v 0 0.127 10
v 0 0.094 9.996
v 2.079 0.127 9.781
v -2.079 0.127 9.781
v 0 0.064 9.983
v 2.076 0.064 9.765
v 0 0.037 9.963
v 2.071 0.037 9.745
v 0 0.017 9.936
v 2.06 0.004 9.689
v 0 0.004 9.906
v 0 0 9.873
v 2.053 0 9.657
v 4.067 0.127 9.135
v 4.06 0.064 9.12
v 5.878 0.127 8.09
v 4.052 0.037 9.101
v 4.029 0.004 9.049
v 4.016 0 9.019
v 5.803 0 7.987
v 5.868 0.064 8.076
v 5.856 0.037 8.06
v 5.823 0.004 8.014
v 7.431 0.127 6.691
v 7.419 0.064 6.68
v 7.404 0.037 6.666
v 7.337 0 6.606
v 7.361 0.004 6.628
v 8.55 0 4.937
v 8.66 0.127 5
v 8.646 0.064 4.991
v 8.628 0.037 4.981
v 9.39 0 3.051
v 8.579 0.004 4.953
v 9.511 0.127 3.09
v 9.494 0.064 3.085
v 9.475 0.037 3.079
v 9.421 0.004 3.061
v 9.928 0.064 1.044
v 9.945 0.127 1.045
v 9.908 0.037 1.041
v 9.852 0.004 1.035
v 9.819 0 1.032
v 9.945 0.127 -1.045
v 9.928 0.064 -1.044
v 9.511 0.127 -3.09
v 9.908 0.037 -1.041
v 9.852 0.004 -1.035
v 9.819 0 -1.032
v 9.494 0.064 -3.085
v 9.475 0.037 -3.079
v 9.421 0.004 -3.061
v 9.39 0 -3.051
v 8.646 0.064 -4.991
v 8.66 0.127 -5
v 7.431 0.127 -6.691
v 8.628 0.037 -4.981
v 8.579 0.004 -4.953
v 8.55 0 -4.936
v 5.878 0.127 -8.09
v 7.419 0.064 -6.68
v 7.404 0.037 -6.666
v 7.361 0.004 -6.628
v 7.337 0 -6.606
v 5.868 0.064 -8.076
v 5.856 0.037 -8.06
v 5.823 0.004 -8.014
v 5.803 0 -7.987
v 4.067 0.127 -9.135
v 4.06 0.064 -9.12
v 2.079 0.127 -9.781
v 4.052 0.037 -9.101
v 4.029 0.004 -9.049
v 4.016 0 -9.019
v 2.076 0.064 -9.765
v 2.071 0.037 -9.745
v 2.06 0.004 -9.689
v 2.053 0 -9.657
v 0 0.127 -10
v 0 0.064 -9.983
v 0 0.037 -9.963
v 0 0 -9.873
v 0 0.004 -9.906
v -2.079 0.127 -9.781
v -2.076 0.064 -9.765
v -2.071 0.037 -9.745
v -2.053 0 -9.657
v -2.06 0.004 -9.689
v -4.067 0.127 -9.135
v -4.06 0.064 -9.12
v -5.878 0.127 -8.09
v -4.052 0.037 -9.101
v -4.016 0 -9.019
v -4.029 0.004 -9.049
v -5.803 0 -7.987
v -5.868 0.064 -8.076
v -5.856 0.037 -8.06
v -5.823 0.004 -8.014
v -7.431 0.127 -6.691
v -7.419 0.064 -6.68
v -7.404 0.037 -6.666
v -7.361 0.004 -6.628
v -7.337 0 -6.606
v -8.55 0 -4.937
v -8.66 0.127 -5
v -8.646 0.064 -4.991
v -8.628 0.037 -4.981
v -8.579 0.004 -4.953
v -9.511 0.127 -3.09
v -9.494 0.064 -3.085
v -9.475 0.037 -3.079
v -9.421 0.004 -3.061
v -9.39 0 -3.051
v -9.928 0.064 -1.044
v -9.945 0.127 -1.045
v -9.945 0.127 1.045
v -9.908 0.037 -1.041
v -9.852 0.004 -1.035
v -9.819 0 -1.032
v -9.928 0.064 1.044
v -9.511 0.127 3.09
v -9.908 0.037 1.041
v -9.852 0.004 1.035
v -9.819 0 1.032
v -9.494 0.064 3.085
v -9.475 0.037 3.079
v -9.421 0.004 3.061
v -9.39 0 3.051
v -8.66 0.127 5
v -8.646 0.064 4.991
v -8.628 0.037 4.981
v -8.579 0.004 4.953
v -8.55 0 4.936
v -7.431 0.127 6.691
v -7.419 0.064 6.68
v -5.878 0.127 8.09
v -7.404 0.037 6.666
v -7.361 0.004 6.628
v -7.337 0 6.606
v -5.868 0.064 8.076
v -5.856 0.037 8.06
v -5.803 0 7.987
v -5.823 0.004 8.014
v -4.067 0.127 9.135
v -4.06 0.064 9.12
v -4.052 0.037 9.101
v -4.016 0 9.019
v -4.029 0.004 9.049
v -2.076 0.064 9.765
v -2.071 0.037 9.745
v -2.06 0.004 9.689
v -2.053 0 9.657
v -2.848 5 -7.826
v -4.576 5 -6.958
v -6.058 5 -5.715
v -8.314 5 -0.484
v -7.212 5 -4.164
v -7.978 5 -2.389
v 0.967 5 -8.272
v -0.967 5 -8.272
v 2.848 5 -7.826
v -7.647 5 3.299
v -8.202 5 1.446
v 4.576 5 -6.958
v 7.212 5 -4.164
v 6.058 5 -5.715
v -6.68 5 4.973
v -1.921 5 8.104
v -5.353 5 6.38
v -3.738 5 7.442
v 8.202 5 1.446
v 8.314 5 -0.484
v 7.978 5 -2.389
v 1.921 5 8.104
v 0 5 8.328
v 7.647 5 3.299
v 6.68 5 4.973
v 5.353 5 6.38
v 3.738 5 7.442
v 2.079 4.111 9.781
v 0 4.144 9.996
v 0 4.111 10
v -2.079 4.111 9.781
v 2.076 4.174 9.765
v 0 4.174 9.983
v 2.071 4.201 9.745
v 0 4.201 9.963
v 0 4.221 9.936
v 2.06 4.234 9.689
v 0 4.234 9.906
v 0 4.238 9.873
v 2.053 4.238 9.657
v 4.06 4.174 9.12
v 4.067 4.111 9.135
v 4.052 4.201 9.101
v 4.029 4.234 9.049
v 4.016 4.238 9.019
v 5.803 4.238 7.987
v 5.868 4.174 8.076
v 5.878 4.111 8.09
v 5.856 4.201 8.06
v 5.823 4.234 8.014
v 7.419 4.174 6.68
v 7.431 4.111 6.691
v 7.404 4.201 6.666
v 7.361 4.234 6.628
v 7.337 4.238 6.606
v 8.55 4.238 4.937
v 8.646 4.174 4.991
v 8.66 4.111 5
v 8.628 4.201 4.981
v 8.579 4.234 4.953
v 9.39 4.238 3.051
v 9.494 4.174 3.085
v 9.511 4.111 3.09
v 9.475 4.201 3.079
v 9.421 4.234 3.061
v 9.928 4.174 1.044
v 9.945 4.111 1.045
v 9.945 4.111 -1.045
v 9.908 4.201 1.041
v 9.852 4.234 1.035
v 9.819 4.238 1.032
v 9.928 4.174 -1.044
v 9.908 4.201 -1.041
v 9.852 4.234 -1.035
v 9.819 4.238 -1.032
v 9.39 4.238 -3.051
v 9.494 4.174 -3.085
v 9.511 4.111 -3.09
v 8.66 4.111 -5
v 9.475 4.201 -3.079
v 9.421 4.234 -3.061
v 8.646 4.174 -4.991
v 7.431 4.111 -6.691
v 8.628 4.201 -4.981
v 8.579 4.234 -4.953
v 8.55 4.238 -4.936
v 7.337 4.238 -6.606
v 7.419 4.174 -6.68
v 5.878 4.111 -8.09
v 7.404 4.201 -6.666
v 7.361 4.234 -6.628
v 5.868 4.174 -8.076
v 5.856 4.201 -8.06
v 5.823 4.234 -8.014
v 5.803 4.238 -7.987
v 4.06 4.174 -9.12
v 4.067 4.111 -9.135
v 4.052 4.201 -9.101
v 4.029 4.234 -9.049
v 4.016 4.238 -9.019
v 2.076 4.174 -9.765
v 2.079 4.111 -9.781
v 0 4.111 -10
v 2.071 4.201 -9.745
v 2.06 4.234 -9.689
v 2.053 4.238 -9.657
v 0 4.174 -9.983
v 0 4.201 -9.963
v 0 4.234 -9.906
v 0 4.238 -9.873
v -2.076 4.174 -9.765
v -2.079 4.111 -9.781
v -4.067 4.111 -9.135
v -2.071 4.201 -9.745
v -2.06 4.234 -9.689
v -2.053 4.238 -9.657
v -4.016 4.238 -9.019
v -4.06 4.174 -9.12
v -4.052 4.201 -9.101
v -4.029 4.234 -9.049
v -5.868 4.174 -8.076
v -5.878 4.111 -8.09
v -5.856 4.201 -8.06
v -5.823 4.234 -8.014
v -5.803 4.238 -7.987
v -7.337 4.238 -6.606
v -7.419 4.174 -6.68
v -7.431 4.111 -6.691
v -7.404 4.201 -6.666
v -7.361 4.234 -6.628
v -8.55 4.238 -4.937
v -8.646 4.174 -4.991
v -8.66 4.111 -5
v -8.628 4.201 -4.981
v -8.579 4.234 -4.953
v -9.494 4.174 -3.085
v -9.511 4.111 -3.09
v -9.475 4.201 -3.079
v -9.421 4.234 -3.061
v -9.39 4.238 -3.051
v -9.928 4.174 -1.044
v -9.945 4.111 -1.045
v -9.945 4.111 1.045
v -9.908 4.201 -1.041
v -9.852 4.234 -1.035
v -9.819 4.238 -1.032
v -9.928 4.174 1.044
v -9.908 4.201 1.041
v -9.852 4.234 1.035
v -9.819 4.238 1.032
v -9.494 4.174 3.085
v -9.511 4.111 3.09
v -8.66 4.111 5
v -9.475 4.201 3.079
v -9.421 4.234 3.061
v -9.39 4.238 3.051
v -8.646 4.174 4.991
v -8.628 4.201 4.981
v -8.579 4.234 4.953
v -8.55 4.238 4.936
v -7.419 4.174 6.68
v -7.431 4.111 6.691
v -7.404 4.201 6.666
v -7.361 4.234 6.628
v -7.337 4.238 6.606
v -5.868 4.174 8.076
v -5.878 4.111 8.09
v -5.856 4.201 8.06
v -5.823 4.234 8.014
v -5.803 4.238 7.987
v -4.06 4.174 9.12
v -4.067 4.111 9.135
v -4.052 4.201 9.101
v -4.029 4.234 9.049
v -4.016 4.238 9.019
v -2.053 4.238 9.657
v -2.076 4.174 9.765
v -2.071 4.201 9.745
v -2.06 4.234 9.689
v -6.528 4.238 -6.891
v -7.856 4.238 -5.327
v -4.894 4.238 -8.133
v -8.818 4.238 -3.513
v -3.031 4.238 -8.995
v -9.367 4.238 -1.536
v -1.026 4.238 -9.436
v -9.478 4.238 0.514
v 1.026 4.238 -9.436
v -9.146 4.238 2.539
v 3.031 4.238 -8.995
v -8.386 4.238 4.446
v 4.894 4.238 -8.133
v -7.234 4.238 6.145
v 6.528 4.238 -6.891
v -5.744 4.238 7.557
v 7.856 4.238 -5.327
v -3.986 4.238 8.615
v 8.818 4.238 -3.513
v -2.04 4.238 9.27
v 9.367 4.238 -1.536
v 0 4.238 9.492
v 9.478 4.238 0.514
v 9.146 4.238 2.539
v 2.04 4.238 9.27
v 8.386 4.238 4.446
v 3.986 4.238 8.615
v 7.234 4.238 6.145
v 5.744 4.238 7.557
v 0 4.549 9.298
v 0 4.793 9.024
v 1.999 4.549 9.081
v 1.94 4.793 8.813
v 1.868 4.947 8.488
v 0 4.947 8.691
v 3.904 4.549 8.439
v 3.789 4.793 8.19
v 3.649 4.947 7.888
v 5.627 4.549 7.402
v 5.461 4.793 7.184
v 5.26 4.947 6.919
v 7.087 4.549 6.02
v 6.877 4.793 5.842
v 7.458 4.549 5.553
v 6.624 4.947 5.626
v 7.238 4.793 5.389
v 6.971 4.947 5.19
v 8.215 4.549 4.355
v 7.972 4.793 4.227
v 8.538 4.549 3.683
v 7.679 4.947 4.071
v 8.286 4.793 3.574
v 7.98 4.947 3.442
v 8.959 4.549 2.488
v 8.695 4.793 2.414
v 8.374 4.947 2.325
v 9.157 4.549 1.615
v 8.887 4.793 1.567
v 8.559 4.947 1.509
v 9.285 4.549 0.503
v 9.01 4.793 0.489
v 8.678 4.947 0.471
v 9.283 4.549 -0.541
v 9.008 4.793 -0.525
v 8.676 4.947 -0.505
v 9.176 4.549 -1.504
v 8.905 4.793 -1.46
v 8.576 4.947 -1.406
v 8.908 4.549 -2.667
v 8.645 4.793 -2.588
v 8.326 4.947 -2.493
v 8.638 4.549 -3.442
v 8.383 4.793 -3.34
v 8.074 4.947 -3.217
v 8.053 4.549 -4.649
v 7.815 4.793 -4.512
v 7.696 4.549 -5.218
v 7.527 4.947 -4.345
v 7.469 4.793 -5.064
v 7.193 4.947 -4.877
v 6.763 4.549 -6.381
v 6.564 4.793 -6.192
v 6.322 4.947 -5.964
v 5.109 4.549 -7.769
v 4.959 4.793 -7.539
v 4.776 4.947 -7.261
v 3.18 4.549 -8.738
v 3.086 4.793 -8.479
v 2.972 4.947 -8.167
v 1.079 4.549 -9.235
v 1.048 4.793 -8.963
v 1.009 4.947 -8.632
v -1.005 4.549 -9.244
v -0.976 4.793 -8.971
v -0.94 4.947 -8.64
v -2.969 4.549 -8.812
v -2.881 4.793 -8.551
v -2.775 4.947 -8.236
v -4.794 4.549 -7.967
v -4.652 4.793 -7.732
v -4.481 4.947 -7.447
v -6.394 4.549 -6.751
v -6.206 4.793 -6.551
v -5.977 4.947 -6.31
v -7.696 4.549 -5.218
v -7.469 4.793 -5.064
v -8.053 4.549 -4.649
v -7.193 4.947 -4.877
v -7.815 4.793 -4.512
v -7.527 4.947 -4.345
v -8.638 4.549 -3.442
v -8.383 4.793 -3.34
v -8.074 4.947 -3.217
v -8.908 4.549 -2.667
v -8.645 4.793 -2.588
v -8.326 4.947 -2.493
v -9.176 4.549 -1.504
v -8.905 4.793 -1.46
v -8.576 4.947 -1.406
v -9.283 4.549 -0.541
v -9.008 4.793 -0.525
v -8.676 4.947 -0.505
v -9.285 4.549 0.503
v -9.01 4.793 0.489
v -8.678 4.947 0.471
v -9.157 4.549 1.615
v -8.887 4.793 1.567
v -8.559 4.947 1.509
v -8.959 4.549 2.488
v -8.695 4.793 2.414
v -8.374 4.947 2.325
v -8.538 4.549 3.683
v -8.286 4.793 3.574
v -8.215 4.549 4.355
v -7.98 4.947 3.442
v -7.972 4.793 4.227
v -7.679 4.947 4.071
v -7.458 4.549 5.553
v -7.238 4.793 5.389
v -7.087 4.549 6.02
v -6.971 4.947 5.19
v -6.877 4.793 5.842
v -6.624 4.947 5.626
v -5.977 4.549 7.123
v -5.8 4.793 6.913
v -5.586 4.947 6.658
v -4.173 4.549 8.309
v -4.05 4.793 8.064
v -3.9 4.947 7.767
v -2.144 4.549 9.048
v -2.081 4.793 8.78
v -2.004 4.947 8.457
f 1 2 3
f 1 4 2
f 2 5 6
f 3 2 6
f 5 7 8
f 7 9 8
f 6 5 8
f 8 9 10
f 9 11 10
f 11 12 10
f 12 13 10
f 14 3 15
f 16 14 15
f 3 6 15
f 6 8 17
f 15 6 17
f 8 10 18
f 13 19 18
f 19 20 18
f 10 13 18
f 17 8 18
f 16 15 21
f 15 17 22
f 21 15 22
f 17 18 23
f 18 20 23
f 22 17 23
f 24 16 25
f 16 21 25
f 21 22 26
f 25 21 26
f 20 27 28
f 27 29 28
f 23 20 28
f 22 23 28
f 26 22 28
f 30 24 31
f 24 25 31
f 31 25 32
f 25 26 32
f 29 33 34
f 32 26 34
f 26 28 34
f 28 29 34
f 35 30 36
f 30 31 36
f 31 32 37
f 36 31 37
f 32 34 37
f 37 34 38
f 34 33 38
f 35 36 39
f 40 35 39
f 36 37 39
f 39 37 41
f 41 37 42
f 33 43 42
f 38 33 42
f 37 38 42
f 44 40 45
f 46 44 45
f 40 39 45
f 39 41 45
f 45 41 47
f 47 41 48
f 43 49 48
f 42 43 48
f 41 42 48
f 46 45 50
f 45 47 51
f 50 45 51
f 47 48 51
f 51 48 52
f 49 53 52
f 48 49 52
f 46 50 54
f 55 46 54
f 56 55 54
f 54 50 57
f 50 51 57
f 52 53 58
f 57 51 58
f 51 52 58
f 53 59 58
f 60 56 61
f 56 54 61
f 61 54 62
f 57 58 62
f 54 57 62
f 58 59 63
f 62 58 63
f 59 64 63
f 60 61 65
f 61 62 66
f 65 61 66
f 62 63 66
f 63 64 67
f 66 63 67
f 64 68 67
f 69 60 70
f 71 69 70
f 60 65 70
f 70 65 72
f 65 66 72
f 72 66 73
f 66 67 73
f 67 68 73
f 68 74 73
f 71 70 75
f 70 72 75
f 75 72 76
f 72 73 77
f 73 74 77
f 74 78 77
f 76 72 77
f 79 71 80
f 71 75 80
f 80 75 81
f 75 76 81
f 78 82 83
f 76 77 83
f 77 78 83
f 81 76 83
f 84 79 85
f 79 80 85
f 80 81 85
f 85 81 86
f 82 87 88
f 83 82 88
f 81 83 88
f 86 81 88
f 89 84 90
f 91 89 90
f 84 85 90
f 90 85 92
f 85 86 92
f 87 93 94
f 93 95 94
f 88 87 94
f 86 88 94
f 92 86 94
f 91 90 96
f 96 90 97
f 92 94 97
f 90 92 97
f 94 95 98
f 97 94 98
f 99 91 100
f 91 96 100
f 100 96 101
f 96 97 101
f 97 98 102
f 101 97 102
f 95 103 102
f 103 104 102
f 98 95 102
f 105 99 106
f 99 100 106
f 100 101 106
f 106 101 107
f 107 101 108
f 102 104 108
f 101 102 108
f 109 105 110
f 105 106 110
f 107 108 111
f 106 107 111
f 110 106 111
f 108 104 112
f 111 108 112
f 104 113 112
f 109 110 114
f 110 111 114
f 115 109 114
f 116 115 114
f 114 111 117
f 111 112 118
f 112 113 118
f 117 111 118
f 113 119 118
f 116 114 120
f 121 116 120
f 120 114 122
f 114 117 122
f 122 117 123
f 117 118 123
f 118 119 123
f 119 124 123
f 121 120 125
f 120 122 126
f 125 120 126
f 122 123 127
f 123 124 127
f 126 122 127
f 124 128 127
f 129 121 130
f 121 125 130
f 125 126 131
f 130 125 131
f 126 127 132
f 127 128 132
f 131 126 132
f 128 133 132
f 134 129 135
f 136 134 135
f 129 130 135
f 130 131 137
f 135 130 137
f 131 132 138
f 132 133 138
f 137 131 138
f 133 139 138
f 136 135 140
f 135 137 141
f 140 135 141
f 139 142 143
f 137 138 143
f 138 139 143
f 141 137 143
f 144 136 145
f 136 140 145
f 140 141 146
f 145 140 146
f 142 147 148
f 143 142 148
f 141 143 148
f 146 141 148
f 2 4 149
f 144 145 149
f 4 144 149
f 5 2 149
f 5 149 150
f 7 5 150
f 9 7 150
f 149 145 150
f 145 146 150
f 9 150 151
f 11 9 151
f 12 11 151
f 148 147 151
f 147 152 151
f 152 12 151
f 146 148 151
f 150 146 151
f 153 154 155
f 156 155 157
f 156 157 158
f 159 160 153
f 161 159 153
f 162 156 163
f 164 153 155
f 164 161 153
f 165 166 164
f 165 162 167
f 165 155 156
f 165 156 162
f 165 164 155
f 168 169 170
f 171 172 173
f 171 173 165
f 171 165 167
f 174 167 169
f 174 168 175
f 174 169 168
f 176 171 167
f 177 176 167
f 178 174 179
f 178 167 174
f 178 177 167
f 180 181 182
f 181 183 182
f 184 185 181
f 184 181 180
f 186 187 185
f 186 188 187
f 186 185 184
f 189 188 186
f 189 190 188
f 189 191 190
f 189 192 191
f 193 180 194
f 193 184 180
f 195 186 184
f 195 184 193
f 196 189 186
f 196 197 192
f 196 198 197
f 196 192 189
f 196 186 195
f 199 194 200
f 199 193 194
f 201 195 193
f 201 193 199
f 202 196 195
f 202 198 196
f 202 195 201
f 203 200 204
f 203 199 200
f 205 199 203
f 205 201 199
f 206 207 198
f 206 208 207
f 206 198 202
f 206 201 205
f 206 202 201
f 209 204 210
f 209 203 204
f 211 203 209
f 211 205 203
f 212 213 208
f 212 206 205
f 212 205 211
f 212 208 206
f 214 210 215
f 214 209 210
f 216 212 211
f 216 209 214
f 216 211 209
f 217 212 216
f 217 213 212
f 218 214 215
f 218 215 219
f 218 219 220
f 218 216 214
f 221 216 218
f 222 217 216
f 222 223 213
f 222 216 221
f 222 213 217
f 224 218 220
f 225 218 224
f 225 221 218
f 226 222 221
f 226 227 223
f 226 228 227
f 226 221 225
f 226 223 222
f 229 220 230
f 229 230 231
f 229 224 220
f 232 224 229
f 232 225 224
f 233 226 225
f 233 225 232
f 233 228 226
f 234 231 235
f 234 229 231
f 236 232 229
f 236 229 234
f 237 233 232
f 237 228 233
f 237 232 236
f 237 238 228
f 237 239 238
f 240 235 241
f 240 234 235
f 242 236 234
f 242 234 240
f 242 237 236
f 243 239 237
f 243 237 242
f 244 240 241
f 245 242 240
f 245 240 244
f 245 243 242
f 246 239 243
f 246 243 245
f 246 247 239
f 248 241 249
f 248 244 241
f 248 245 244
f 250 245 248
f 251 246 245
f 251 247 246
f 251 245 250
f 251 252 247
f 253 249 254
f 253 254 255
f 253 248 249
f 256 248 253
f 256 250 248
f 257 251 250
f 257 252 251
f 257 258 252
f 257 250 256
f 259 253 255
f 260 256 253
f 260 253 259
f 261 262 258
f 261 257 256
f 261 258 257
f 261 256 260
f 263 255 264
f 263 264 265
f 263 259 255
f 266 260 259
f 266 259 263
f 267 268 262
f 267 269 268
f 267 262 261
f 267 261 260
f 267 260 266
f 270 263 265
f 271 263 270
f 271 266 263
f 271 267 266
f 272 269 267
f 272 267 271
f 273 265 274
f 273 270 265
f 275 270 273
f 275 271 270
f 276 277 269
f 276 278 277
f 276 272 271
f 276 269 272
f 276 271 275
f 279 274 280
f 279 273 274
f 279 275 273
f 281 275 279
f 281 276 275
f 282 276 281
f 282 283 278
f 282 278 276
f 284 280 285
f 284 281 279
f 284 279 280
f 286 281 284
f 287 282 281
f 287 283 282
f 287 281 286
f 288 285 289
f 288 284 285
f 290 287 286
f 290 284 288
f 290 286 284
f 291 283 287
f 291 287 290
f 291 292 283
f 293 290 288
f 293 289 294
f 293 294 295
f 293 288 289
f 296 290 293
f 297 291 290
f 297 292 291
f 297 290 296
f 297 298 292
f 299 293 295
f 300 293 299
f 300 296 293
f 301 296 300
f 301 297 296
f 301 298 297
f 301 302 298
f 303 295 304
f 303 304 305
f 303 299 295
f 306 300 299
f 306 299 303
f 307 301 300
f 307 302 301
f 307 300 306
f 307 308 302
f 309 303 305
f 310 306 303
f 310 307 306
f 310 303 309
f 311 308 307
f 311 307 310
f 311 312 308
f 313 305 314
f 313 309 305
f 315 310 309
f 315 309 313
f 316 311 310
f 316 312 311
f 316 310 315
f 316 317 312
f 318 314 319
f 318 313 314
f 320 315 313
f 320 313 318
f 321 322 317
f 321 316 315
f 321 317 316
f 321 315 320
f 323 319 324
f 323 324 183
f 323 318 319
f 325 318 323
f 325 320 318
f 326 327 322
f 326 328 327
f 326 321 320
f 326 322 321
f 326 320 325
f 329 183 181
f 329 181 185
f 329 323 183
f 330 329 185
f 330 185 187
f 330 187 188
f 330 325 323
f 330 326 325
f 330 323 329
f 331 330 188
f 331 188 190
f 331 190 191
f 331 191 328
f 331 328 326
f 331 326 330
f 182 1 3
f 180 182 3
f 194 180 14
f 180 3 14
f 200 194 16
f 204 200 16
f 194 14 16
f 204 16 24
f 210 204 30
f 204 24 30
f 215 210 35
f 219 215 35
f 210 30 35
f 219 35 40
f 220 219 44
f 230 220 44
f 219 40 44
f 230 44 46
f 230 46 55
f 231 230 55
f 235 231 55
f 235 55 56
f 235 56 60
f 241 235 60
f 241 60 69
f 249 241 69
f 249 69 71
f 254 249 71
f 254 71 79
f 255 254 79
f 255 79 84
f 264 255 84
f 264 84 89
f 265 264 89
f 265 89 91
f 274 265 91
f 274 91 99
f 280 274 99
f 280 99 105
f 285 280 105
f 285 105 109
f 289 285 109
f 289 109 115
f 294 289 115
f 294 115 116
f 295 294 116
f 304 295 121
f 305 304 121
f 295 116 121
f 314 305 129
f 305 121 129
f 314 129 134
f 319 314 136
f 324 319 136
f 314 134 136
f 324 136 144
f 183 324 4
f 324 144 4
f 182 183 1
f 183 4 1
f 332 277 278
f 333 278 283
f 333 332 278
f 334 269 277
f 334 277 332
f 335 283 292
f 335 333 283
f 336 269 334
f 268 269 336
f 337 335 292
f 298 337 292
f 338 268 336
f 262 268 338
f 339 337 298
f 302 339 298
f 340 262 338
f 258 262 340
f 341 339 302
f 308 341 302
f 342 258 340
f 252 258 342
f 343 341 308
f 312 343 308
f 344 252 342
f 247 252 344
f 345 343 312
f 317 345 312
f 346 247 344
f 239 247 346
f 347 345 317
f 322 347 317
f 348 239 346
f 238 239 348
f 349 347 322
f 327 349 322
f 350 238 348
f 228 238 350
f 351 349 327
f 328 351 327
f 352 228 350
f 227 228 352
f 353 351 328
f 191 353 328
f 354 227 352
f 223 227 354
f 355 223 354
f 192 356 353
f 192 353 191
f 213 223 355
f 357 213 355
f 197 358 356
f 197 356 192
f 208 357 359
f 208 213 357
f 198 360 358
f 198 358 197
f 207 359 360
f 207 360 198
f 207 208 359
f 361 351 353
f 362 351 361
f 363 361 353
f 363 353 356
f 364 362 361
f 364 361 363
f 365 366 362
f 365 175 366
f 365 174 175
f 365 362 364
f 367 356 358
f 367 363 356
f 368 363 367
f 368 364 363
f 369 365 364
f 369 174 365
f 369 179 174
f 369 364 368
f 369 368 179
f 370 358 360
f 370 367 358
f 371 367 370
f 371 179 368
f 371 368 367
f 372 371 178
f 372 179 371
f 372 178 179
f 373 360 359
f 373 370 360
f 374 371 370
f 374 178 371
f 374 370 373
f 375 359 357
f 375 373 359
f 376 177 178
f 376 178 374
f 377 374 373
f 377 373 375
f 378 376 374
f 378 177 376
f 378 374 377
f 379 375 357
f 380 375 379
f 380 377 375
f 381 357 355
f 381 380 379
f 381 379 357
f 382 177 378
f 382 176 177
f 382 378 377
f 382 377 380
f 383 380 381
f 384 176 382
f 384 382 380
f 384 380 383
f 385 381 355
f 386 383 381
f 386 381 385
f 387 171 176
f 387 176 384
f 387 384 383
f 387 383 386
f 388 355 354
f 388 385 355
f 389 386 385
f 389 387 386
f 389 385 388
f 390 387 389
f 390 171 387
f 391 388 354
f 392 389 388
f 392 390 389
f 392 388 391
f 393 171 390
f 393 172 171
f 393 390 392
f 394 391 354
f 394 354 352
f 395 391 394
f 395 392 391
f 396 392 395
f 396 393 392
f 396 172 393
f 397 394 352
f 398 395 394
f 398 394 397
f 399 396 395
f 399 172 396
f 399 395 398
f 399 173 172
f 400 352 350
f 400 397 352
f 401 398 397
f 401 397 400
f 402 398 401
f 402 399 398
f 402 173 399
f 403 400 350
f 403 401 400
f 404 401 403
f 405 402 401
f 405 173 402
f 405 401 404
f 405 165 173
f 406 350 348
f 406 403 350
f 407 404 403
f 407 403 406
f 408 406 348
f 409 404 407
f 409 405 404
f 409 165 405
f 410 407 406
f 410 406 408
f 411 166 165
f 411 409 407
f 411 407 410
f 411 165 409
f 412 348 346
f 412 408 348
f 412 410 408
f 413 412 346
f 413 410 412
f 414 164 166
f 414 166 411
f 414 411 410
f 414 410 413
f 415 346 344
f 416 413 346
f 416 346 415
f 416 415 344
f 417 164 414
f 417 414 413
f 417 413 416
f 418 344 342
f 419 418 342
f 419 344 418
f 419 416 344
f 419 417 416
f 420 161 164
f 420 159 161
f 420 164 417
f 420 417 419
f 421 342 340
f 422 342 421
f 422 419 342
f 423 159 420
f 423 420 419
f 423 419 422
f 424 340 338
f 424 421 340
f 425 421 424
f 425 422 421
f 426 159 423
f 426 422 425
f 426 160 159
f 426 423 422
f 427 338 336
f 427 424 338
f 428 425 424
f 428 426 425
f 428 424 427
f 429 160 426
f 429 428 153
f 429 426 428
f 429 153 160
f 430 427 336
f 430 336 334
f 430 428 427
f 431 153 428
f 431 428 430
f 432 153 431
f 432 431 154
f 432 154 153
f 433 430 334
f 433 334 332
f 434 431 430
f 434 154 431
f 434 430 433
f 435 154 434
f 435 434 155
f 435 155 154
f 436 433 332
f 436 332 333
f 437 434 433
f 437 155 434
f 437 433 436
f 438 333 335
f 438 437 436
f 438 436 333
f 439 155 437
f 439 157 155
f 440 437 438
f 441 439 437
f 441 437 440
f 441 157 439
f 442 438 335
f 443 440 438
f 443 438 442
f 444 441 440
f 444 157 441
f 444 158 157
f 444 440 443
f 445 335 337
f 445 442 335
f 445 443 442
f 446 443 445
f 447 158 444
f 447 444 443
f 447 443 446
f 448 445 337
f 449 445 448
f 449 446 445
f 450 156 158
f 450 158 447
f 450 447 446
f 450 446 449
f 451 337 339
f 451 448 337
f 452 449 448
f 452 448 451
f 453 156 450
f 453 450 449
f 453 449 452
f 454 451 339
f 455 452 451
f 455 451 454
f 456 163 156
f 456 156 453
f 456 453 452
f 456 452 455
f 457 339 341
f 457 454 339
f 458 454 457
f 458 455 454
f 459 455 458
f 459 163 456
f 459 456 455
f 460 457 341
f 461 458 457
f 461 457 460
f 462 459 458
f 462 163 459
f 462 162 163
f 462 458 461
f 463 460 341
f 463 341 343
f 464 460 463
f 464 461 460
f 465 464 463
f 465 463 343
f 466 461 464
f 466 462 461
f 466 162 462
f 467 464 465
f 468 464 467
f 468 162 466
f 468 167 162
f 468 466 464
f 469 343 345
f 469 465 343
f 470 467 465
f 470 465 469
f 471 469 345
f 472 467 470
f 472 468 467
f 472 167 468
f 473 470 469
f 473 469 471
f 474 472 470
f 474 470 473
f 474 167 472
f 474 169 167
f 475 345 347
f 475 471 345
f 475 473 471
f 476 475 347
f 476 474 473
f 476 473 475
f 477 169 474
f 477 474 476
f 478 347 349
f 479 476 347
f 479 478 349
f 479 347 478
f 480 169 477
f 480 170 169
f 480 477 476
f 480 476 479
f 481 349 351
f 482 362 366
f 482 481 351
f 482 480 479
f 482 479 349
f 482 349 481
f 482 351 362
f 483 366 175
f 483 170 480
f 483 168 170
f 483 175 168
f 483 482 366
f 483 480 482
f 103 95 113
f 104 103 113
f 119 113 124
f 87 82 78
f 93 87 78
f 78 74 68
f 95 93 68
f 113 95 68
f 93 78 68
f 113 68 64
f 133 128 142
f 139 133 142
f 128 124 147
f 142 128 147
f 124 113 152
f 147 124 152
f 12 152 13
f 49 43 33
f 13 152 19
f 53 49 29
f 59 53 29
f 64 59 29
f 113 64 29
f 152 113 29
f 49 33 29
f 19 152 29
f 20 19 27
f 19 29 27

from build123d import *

# Parameters (mm, degrees)
SKETCH1_R           = 10
BOSS_EXTRUDE1_DEPTH = 5
CUT_EXTRUDE1_START  = -0.762
SKETCH2_R           = 10
SKETCH2_R_2         = 9.492
CUT_EXTRUDE1_DEPTH  = 0.762
FILLET3_R           = 1.27
FILLET2_R           = 0.127


with BuildPart() as part:
    # Sketch1 → Boss-Extrude1 (new body)
    with BuildSketch(Plane(origin=(0, 0, 0), x_dir=(1, 0, 0), z_dir=(0, 1, 0))):
        with Locations(Location((0, 0, 0), (0, 0, 270))):
            Circle(SKETCH1_R)
    extrude(amount=BOSS_EXTRUDE1_DEPTH)

    # Sketch2 → Cut-Extrude1 (cut)
    with BuildSketch(Plane(origin=(0, 5, 0), x_dir=(1, 0, 0), z_dir=(0, 1, 0)).offset(CUT_EXTRUDE1_START)):
        with Locations(Location((0, 0, 0), (0, 0, 270))):
            Circle(SKETCH2_R)
        with Locations(Location((0, 0, 0), (0, 0, 270))):
            Circle(SKETCH2_R_2, mode=Mode.SUBTRACT)
    extrude(amount=CUT_EXTRUDE1_DEPTH, mode=Mode.SUBTRACT)

    # Fillet3
    # the kernel refuses this fillet: 1.27 mm, written as the material it takes off along each edge
    with BuildSketch(Plane(origin=(0, 5, 0), x_dir=(0, 0, 1), z_dir=(-1, 0, 0))) as fillet3_piece_1:
        with BuildLine():
            CenterArc((8.328025773, -1.27), FILLET3_R, 23.578178478, 66.421821522)
            Line((8.328025773, 0), (8.328025773, 0.0254))
            Line((8.328025773, 0.0254), (9.492, 0.0254))
            Line((9.492, 0.0254), (9.5174, 0))
            ThreePointArc((9.5174, 0), (9.5174, -0.381), (9.515279485, -0.75184))
            Line((9.515279485, -0.75184), (9.492, -0.762))
        make_face()
    revolve(axis=Axis((0, 5, 0), (0, 1, 0)), mode=Mode.SUBTRACT)

    # Fillet2
    fillet2_edges = [part.edges().sort_by_distance(p)[0] for p in [
        (0, 0, -10),
        (0, 4.238, -10),
    ]]
    fillet(fillet2_edges, radius=FILLET2_R)


solid = part.part
